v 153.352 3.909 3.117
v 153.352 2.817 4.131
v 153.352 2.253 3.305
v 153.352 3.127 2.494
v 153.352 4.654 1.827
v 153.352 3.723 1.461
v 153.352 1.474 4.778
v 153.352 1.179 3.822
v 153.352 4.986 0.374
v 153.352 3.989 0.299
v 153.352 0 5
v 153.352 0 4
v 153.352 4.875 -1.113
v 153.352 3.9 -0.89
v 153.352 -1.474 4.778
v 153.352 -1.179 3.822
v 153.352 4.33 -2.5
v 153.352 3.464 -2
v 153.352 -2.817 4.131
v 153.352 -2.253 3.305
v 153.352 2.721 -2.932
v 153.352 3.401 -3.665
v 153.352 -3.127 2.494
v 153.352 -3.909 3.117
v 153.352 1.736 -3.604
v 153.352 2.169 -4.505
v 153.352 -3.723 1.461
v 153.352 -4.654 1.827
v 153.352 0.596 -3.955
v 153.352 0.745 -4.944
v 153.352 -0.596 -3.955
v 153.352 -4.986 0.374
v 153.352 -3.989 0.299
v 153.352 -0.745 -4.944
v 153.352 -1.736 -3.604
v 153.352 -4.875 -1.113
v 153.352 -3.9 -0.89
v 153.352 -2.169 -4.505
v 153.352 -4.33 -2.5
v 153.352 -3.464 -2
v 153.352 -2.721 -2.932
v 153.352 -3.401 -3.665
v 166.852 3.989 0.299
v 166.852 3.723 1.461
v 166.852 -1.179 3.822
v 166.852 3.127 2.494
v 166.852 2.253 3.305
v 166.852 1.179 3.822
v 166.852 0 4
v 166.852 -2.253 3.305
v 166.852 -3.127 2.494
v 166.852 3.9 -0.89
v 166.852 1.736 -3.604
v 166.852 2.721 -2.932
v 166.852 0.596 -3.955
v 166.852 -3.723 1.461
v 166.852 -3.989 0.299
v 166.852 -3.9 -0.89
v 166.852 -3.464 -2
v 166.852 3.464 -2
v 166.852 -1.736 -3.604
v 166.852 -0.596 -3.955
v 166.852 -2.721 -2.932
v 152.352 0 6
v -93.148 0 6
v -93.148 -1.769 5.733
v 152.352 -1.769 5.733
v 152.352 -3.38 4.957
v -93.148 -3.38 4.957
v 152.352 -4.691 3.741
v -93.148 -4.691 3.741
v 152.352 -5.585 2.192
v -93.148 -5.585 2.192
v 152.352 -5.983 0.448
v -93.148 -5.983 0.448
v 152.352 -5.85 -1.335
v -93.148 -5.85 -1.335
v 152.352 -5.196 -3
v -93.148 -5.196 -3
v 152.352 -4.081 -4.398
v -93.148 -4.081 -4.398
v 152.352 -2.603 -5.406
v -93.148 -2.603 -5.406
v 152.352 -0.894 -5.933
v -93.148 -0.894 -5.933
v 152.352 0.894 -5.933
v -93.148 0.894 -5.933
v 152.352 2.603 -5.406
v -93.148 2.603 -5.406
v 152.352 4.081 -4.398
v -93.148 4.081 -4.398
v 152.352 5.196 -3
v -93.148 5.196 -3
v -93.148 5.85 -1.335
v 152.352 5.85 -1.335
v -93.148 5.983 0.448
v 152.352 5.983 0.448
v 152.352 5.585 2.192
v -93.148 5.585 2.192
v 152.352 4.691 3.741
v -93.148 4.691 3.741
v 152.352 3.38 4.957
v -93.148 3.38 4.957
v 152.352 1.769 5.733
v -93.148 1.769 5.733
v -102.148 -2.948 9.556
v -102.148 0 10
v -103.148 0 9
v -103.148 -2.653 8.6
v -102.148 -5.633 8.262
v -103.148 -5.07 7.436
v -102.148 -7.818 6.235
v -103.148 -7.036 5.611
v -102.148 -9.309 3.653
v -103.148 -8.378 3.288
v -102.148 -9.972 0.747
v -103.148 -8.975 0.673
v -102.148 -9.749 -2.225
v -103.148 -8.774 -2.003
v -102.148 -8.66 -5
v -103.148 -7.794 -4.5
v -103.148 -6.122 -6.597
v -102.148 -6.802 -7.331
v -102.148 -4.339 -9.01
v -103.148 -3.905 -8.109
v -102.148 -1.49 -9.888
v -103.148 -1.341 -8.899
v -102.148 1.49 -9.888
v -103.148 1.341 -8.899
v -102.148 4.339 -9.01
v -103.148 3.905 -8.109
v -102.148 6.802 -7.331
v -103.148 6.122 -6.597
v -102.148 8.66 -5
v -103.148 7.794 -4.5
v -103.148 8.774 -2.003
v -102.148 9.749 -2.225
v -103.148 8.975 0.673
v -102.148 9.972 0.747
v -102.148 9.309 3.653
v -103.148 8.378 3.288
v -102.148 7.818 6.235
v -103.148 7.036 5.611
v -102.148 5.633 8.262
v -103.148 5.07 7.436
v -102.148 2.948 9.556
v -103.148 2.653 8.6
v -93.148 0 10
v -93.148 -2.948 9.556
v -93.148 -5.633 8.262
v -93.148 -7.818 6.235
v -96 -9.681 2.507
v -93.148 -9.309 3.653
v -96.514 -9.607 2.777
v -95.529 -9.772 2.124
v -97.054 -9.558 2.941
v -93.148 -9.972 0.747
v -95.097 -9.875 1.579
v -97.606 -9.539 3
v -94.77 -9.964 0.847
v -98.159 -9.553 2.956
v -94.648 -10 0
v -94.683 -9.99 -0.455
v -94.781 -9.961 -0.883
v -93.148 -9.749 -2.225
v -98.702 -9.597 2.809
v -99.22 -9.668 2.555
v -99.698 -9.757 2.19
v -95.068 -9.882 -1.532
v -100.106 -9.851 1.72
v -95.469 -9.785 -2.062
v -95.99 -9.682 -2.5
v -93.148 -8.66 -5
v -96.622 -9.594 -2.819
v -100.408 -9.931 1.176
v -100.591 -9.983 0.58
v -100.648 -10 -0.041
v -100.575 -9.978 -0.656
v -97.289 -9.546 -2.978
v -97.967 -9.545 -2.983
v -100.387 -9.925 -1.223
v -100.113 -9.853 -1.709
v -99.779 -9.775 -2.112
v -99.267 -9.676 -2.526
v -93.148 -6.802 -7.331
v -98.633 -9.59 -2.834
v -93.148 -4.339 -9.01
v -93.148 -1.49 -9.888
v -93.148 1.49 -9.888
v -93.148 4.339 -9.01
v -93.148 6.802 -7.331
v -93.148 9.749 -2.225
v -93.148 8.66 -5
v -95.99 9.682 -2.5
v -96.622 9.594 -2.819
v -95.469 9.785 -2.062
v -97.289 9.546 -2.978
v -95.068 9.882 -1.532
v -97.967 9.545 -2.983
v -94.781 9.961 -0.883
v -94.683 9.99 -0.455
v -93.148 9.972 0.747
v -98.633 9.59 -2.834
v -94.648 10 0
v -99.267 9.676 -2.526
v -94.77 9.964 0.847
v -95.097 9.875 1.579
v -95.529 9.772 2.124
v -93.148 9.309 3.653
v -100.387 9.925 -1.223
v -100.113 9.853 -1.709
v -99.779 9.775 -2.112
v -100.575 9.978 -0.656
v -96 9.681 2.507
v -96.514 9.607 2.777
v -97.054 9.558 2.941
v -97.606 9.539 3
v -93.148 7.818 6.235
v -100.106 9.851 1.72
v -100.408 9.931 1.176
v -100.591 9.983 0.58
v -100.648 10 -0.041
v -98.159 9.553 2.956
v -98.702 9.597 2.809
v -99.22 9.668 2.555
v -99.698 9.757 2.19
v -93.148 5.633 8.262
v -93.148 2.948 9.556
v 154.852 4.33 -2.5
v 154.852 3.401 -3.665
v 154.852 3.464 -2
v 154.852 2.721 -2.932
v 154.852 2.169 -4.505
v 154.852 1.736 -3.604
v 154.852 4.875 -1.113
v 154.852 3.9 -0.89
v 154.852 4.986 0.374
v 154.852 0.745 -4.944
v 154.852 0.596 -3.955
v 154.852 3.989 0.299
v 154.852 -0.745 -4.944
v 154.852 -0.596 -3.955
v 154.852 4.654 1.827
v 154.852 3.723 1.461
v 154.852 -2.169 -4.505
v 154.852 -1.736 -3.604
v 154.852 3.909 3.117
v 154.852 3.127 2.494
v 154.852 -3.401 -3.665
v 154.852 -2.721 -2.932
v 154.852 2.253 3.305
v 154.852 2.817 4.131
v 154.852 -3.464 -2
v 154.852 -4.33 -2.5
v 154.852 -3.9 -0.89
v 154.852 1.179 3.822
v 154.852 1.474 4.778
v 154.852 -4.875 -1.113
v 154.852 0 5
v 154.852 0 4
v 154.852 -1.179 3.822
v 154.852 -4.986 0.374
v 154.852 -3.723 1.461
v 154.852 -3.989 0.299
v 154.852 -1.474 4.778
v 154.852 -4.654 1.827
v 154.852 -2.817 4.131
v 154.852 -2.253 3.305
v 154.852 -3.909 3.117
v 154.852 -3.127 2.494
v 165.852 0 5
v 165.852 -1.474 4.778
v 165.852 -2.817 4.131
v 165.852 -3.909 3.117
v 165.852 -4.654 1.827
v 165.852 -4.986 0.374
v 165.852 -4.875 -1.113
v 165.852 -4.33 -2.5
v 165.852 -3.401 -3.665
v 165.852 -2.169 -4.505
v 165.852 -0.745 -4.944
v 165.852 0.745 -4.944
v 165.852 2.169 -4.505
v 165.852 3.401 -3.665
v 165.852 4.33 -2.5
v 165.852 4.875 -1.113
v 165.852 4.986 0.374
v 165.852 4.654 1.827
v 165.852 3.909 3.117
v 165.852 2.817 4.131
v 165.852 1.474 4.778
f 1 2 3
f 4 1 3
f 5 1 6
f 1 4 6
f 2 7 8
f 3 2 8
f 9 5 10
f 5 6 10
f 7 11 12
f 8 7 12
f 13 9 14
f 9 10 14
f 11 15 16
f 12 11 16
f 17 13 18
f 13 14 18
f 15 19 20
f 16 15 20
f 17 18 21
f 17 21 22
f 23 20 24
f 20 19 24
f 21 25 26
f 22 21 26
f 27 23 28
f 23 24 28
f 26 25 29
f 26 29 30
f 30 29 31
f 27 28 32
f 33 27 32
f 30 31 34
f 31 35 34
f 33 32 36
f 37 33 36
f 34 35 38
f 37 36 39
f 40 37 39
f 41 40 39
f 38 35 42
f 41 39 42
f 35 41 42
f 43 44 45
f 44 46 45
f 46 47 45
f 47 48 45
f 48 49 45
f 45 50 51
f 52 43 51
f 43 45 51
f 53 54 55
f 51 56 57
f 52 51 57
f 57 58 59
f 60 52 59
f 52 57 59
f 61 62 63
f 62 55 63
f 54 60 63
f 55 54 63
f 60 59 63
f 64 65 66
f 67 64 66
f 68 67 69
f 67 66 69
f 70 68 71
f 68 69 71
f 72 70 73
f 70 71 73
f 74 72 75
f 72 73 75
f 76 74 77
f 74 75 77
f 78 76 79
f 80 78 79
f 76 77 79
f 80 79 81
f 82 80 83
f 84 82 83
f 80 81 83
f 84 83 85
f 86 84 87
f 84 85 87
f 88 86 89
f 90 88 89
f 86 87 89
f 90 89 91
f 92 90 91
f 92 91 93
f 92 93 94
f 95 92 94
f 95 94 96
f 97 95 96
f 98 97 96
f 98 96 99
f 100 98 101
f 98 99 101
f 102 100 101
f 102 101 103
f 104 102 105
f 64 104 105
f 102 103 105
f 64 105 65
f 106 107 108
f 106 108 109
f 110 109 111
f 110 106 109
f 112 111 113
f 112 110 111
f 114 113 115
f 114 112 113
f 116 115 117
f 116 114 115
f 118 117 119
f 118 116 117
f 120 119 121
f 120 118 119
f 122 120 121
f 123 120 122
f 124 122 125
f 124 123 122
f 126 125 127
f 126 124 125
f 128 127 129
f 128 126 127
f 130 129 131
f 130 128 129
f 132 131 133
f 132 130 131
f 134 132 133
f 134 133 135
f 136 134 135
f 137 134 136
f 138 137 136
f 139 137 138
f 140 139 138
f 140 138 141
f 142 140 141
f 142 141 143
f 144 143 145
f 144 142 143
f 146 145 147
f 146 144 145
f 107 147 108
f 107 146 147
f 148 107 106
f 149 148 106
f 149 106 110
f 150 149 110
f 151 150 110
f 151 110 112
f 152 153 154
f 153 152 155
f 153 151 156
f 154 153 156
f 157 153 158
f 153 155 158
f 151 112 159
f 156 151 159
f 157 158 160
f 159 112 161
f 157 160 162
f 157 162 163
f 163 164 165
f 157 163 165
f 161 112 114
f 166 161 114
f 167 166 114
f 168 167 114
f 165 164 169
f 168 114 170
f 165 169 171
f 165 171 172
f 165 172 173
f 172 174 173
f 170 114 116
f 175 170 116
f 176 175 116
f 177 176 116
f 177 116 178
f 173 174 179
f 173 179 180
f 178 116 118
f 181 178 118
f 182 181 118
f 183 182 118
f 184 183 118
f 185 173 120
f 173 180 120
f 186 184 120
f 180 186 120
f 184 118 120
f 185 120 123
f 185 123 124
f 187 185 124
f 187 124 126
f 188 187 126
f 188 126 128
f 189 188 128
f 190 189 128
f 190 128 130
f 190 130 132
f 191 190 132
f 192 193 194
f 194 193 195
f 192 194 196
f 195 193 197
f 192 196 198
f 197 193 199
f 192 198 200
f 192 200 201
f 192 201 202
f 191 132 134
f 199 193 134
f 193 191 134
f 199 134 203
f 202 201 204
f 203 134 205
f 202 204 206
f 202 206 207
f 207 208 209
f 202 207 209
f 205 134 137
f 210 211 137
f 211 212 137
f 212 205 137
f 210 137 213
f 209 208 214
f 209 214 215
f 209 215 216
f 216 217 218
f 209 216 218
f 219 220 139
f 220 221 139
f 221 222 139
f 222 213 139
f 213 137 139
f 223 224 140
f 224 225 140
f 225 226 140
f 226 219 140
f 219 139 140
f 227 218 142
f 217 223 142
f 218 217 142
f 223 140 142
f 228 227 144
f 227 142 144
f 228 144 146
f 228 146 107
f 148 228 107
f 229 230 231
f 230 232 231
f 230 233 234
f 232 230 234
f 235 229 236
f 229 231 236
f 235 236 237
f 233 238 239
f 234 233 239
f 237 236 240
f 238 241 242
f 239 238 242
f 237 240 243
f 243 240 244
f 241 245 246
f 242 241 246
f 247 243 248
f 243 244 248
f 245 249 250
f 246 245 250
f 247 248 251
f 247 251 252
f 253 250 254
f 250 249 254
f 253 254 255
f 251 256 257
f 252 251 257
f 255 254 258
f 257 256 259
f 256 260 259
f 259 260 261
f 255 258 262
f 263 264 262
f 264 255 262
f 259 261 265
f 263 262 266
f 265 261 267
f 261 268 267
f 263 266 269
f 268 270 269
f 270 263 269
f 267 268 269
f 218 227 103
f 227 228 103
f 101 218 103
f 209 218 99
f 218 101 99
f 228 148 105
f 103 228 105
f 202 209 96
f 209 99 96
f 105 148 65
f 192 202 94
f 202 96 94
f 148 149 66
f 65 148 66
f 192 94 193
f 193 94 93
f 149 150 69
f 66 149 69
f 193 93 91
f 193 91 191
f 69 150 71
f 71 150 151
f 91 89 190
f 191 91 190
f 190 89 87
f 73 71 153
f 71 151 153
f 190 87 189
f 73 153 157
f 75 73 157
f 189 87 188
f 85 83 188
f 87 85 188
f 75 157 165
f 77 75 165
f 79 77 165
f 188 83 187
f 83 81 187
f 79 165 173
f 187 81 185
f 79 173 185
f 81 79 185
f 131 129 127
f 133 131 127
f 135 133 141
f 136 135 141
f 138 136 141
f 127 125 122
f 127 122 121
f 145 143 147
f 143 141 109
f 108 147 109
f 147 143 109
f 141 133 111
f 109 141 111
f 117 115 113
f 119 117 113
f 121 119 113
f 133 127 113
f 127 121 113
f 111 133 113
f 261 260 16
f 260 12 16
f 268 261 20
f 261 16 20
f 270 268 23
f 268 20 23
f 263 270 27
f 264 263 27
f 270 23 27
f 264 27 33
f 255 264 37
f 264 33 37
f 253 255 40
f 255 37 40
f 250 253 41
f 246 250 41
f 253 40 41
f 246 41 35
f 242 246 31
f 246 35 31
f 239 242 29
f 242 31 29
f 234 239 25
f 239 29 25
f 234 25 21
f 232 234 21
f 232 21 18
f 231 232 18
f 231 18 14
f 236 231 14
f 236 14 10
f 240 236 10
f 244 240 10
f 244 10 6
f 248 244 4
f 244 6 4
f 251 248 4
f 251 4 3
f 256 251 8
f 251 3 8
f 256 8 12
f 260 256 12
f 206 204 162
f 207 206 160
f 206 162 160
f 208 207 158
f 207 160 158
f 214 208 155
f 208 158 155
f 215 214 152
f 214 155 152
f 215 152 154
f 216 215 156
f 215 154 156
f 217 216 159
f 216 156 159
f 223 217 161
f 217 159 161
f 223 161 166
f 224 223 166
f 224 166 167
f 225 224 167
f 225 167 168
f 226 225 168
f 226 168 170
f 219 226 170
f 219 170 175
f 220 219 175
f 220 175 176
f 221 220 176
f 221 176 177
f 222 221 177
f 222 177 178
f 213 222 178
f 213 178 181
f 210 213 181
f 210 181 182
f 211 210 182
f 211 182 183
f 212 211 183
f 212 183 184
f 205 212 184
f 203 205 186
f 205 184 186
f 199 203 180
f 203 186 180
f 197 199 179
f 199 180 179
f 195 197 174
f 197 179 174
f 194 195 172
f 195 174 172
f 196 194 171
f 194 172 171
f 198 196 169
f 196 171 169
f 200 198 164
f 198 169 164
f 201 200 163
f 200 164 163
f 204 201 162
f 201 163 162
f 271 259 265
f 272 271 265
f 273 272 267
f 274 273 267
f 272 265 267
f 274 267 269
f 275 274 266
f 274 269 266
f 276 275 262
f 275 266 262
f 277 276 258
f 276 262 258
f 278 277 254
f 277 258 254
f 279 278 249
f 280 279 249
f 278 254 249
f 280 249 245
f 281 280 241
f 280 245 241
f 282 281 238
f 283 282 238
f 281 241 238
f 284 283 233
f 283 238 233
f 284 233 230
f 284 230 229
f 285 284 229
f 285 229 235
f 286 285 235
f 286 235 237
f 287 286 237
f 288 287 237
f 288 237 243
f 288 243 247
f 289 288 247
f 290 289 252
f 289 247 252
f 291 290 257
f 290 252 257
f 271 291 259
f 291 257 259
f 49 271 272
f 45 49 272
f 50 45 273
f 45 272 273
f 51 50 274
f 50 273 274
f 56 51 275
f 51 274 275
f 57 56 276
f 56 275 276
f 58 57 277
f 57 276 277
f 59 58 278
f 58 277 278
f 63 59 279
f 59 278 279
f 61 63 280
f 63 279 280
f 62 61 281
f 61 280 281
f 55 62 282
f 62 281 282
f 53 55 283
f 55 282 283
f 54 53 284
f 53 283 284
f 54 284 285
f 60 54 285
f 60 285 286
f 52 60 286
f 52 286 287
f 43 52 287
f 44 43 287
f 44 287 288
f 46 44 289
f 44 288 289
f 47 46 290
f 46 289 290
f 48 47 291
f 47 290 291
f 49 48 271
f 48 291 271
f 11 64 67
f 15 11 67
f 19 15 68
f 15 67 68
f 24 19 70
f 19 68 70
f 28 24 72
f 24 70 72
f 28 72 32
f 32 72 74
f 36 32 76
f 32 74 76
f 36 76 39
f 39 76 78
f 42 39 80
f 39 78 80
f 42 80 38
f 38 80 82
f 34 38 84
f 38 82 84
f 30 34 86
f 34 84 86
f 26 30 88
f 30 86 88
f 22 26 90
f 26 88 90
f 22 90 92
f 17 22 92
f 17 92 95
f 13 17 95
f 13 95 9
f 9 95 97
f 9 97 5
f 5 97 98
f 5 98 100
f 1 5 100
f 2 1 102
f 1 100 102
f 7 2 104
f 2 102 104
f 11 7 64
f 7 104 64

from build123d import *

# Parameters (mm, degrees)
F2_SIZE  = 1
F4_R     = 3
F5_DEPTH = 39.4


with BuildPart() as f1:
    # F0 (on Front) → F1 (revolve)
    with BuildSketch(Plane.XZ):
        Polygon((-103.14801, 10), (-103.14801, 0), (166.85199, 0), (166.85199, 5), (154.85199, 5), (154.85199, 4), (153.35199, 4), (153.35199, 6), (-93.14801, 6), (-93.14801, 10), align=None)
    revolve(axis=Axis((31.85199, 0, 0), (1, 0, 0)))

    # F2
    f2_edges = [f1.edges().sort_by_distance(p)[0] for p in [
        (153.35199, 0, -6),
        (-103.14801, 0, -10),
        (166.85199, 0, -5),
    ]]
    chamfer(f2_edges, length=F2_SIZE)

    # F4 (on offset) → F5 (cut)
    with BuildSketch(Plane.XZ.offset(25)):
        with Locations((-97.64801, 0)):
            Circle(F4_R)
    extrude(amount=-F5_DEPTH, mode=Mode.SUBTRACT)


solid = f1.part
